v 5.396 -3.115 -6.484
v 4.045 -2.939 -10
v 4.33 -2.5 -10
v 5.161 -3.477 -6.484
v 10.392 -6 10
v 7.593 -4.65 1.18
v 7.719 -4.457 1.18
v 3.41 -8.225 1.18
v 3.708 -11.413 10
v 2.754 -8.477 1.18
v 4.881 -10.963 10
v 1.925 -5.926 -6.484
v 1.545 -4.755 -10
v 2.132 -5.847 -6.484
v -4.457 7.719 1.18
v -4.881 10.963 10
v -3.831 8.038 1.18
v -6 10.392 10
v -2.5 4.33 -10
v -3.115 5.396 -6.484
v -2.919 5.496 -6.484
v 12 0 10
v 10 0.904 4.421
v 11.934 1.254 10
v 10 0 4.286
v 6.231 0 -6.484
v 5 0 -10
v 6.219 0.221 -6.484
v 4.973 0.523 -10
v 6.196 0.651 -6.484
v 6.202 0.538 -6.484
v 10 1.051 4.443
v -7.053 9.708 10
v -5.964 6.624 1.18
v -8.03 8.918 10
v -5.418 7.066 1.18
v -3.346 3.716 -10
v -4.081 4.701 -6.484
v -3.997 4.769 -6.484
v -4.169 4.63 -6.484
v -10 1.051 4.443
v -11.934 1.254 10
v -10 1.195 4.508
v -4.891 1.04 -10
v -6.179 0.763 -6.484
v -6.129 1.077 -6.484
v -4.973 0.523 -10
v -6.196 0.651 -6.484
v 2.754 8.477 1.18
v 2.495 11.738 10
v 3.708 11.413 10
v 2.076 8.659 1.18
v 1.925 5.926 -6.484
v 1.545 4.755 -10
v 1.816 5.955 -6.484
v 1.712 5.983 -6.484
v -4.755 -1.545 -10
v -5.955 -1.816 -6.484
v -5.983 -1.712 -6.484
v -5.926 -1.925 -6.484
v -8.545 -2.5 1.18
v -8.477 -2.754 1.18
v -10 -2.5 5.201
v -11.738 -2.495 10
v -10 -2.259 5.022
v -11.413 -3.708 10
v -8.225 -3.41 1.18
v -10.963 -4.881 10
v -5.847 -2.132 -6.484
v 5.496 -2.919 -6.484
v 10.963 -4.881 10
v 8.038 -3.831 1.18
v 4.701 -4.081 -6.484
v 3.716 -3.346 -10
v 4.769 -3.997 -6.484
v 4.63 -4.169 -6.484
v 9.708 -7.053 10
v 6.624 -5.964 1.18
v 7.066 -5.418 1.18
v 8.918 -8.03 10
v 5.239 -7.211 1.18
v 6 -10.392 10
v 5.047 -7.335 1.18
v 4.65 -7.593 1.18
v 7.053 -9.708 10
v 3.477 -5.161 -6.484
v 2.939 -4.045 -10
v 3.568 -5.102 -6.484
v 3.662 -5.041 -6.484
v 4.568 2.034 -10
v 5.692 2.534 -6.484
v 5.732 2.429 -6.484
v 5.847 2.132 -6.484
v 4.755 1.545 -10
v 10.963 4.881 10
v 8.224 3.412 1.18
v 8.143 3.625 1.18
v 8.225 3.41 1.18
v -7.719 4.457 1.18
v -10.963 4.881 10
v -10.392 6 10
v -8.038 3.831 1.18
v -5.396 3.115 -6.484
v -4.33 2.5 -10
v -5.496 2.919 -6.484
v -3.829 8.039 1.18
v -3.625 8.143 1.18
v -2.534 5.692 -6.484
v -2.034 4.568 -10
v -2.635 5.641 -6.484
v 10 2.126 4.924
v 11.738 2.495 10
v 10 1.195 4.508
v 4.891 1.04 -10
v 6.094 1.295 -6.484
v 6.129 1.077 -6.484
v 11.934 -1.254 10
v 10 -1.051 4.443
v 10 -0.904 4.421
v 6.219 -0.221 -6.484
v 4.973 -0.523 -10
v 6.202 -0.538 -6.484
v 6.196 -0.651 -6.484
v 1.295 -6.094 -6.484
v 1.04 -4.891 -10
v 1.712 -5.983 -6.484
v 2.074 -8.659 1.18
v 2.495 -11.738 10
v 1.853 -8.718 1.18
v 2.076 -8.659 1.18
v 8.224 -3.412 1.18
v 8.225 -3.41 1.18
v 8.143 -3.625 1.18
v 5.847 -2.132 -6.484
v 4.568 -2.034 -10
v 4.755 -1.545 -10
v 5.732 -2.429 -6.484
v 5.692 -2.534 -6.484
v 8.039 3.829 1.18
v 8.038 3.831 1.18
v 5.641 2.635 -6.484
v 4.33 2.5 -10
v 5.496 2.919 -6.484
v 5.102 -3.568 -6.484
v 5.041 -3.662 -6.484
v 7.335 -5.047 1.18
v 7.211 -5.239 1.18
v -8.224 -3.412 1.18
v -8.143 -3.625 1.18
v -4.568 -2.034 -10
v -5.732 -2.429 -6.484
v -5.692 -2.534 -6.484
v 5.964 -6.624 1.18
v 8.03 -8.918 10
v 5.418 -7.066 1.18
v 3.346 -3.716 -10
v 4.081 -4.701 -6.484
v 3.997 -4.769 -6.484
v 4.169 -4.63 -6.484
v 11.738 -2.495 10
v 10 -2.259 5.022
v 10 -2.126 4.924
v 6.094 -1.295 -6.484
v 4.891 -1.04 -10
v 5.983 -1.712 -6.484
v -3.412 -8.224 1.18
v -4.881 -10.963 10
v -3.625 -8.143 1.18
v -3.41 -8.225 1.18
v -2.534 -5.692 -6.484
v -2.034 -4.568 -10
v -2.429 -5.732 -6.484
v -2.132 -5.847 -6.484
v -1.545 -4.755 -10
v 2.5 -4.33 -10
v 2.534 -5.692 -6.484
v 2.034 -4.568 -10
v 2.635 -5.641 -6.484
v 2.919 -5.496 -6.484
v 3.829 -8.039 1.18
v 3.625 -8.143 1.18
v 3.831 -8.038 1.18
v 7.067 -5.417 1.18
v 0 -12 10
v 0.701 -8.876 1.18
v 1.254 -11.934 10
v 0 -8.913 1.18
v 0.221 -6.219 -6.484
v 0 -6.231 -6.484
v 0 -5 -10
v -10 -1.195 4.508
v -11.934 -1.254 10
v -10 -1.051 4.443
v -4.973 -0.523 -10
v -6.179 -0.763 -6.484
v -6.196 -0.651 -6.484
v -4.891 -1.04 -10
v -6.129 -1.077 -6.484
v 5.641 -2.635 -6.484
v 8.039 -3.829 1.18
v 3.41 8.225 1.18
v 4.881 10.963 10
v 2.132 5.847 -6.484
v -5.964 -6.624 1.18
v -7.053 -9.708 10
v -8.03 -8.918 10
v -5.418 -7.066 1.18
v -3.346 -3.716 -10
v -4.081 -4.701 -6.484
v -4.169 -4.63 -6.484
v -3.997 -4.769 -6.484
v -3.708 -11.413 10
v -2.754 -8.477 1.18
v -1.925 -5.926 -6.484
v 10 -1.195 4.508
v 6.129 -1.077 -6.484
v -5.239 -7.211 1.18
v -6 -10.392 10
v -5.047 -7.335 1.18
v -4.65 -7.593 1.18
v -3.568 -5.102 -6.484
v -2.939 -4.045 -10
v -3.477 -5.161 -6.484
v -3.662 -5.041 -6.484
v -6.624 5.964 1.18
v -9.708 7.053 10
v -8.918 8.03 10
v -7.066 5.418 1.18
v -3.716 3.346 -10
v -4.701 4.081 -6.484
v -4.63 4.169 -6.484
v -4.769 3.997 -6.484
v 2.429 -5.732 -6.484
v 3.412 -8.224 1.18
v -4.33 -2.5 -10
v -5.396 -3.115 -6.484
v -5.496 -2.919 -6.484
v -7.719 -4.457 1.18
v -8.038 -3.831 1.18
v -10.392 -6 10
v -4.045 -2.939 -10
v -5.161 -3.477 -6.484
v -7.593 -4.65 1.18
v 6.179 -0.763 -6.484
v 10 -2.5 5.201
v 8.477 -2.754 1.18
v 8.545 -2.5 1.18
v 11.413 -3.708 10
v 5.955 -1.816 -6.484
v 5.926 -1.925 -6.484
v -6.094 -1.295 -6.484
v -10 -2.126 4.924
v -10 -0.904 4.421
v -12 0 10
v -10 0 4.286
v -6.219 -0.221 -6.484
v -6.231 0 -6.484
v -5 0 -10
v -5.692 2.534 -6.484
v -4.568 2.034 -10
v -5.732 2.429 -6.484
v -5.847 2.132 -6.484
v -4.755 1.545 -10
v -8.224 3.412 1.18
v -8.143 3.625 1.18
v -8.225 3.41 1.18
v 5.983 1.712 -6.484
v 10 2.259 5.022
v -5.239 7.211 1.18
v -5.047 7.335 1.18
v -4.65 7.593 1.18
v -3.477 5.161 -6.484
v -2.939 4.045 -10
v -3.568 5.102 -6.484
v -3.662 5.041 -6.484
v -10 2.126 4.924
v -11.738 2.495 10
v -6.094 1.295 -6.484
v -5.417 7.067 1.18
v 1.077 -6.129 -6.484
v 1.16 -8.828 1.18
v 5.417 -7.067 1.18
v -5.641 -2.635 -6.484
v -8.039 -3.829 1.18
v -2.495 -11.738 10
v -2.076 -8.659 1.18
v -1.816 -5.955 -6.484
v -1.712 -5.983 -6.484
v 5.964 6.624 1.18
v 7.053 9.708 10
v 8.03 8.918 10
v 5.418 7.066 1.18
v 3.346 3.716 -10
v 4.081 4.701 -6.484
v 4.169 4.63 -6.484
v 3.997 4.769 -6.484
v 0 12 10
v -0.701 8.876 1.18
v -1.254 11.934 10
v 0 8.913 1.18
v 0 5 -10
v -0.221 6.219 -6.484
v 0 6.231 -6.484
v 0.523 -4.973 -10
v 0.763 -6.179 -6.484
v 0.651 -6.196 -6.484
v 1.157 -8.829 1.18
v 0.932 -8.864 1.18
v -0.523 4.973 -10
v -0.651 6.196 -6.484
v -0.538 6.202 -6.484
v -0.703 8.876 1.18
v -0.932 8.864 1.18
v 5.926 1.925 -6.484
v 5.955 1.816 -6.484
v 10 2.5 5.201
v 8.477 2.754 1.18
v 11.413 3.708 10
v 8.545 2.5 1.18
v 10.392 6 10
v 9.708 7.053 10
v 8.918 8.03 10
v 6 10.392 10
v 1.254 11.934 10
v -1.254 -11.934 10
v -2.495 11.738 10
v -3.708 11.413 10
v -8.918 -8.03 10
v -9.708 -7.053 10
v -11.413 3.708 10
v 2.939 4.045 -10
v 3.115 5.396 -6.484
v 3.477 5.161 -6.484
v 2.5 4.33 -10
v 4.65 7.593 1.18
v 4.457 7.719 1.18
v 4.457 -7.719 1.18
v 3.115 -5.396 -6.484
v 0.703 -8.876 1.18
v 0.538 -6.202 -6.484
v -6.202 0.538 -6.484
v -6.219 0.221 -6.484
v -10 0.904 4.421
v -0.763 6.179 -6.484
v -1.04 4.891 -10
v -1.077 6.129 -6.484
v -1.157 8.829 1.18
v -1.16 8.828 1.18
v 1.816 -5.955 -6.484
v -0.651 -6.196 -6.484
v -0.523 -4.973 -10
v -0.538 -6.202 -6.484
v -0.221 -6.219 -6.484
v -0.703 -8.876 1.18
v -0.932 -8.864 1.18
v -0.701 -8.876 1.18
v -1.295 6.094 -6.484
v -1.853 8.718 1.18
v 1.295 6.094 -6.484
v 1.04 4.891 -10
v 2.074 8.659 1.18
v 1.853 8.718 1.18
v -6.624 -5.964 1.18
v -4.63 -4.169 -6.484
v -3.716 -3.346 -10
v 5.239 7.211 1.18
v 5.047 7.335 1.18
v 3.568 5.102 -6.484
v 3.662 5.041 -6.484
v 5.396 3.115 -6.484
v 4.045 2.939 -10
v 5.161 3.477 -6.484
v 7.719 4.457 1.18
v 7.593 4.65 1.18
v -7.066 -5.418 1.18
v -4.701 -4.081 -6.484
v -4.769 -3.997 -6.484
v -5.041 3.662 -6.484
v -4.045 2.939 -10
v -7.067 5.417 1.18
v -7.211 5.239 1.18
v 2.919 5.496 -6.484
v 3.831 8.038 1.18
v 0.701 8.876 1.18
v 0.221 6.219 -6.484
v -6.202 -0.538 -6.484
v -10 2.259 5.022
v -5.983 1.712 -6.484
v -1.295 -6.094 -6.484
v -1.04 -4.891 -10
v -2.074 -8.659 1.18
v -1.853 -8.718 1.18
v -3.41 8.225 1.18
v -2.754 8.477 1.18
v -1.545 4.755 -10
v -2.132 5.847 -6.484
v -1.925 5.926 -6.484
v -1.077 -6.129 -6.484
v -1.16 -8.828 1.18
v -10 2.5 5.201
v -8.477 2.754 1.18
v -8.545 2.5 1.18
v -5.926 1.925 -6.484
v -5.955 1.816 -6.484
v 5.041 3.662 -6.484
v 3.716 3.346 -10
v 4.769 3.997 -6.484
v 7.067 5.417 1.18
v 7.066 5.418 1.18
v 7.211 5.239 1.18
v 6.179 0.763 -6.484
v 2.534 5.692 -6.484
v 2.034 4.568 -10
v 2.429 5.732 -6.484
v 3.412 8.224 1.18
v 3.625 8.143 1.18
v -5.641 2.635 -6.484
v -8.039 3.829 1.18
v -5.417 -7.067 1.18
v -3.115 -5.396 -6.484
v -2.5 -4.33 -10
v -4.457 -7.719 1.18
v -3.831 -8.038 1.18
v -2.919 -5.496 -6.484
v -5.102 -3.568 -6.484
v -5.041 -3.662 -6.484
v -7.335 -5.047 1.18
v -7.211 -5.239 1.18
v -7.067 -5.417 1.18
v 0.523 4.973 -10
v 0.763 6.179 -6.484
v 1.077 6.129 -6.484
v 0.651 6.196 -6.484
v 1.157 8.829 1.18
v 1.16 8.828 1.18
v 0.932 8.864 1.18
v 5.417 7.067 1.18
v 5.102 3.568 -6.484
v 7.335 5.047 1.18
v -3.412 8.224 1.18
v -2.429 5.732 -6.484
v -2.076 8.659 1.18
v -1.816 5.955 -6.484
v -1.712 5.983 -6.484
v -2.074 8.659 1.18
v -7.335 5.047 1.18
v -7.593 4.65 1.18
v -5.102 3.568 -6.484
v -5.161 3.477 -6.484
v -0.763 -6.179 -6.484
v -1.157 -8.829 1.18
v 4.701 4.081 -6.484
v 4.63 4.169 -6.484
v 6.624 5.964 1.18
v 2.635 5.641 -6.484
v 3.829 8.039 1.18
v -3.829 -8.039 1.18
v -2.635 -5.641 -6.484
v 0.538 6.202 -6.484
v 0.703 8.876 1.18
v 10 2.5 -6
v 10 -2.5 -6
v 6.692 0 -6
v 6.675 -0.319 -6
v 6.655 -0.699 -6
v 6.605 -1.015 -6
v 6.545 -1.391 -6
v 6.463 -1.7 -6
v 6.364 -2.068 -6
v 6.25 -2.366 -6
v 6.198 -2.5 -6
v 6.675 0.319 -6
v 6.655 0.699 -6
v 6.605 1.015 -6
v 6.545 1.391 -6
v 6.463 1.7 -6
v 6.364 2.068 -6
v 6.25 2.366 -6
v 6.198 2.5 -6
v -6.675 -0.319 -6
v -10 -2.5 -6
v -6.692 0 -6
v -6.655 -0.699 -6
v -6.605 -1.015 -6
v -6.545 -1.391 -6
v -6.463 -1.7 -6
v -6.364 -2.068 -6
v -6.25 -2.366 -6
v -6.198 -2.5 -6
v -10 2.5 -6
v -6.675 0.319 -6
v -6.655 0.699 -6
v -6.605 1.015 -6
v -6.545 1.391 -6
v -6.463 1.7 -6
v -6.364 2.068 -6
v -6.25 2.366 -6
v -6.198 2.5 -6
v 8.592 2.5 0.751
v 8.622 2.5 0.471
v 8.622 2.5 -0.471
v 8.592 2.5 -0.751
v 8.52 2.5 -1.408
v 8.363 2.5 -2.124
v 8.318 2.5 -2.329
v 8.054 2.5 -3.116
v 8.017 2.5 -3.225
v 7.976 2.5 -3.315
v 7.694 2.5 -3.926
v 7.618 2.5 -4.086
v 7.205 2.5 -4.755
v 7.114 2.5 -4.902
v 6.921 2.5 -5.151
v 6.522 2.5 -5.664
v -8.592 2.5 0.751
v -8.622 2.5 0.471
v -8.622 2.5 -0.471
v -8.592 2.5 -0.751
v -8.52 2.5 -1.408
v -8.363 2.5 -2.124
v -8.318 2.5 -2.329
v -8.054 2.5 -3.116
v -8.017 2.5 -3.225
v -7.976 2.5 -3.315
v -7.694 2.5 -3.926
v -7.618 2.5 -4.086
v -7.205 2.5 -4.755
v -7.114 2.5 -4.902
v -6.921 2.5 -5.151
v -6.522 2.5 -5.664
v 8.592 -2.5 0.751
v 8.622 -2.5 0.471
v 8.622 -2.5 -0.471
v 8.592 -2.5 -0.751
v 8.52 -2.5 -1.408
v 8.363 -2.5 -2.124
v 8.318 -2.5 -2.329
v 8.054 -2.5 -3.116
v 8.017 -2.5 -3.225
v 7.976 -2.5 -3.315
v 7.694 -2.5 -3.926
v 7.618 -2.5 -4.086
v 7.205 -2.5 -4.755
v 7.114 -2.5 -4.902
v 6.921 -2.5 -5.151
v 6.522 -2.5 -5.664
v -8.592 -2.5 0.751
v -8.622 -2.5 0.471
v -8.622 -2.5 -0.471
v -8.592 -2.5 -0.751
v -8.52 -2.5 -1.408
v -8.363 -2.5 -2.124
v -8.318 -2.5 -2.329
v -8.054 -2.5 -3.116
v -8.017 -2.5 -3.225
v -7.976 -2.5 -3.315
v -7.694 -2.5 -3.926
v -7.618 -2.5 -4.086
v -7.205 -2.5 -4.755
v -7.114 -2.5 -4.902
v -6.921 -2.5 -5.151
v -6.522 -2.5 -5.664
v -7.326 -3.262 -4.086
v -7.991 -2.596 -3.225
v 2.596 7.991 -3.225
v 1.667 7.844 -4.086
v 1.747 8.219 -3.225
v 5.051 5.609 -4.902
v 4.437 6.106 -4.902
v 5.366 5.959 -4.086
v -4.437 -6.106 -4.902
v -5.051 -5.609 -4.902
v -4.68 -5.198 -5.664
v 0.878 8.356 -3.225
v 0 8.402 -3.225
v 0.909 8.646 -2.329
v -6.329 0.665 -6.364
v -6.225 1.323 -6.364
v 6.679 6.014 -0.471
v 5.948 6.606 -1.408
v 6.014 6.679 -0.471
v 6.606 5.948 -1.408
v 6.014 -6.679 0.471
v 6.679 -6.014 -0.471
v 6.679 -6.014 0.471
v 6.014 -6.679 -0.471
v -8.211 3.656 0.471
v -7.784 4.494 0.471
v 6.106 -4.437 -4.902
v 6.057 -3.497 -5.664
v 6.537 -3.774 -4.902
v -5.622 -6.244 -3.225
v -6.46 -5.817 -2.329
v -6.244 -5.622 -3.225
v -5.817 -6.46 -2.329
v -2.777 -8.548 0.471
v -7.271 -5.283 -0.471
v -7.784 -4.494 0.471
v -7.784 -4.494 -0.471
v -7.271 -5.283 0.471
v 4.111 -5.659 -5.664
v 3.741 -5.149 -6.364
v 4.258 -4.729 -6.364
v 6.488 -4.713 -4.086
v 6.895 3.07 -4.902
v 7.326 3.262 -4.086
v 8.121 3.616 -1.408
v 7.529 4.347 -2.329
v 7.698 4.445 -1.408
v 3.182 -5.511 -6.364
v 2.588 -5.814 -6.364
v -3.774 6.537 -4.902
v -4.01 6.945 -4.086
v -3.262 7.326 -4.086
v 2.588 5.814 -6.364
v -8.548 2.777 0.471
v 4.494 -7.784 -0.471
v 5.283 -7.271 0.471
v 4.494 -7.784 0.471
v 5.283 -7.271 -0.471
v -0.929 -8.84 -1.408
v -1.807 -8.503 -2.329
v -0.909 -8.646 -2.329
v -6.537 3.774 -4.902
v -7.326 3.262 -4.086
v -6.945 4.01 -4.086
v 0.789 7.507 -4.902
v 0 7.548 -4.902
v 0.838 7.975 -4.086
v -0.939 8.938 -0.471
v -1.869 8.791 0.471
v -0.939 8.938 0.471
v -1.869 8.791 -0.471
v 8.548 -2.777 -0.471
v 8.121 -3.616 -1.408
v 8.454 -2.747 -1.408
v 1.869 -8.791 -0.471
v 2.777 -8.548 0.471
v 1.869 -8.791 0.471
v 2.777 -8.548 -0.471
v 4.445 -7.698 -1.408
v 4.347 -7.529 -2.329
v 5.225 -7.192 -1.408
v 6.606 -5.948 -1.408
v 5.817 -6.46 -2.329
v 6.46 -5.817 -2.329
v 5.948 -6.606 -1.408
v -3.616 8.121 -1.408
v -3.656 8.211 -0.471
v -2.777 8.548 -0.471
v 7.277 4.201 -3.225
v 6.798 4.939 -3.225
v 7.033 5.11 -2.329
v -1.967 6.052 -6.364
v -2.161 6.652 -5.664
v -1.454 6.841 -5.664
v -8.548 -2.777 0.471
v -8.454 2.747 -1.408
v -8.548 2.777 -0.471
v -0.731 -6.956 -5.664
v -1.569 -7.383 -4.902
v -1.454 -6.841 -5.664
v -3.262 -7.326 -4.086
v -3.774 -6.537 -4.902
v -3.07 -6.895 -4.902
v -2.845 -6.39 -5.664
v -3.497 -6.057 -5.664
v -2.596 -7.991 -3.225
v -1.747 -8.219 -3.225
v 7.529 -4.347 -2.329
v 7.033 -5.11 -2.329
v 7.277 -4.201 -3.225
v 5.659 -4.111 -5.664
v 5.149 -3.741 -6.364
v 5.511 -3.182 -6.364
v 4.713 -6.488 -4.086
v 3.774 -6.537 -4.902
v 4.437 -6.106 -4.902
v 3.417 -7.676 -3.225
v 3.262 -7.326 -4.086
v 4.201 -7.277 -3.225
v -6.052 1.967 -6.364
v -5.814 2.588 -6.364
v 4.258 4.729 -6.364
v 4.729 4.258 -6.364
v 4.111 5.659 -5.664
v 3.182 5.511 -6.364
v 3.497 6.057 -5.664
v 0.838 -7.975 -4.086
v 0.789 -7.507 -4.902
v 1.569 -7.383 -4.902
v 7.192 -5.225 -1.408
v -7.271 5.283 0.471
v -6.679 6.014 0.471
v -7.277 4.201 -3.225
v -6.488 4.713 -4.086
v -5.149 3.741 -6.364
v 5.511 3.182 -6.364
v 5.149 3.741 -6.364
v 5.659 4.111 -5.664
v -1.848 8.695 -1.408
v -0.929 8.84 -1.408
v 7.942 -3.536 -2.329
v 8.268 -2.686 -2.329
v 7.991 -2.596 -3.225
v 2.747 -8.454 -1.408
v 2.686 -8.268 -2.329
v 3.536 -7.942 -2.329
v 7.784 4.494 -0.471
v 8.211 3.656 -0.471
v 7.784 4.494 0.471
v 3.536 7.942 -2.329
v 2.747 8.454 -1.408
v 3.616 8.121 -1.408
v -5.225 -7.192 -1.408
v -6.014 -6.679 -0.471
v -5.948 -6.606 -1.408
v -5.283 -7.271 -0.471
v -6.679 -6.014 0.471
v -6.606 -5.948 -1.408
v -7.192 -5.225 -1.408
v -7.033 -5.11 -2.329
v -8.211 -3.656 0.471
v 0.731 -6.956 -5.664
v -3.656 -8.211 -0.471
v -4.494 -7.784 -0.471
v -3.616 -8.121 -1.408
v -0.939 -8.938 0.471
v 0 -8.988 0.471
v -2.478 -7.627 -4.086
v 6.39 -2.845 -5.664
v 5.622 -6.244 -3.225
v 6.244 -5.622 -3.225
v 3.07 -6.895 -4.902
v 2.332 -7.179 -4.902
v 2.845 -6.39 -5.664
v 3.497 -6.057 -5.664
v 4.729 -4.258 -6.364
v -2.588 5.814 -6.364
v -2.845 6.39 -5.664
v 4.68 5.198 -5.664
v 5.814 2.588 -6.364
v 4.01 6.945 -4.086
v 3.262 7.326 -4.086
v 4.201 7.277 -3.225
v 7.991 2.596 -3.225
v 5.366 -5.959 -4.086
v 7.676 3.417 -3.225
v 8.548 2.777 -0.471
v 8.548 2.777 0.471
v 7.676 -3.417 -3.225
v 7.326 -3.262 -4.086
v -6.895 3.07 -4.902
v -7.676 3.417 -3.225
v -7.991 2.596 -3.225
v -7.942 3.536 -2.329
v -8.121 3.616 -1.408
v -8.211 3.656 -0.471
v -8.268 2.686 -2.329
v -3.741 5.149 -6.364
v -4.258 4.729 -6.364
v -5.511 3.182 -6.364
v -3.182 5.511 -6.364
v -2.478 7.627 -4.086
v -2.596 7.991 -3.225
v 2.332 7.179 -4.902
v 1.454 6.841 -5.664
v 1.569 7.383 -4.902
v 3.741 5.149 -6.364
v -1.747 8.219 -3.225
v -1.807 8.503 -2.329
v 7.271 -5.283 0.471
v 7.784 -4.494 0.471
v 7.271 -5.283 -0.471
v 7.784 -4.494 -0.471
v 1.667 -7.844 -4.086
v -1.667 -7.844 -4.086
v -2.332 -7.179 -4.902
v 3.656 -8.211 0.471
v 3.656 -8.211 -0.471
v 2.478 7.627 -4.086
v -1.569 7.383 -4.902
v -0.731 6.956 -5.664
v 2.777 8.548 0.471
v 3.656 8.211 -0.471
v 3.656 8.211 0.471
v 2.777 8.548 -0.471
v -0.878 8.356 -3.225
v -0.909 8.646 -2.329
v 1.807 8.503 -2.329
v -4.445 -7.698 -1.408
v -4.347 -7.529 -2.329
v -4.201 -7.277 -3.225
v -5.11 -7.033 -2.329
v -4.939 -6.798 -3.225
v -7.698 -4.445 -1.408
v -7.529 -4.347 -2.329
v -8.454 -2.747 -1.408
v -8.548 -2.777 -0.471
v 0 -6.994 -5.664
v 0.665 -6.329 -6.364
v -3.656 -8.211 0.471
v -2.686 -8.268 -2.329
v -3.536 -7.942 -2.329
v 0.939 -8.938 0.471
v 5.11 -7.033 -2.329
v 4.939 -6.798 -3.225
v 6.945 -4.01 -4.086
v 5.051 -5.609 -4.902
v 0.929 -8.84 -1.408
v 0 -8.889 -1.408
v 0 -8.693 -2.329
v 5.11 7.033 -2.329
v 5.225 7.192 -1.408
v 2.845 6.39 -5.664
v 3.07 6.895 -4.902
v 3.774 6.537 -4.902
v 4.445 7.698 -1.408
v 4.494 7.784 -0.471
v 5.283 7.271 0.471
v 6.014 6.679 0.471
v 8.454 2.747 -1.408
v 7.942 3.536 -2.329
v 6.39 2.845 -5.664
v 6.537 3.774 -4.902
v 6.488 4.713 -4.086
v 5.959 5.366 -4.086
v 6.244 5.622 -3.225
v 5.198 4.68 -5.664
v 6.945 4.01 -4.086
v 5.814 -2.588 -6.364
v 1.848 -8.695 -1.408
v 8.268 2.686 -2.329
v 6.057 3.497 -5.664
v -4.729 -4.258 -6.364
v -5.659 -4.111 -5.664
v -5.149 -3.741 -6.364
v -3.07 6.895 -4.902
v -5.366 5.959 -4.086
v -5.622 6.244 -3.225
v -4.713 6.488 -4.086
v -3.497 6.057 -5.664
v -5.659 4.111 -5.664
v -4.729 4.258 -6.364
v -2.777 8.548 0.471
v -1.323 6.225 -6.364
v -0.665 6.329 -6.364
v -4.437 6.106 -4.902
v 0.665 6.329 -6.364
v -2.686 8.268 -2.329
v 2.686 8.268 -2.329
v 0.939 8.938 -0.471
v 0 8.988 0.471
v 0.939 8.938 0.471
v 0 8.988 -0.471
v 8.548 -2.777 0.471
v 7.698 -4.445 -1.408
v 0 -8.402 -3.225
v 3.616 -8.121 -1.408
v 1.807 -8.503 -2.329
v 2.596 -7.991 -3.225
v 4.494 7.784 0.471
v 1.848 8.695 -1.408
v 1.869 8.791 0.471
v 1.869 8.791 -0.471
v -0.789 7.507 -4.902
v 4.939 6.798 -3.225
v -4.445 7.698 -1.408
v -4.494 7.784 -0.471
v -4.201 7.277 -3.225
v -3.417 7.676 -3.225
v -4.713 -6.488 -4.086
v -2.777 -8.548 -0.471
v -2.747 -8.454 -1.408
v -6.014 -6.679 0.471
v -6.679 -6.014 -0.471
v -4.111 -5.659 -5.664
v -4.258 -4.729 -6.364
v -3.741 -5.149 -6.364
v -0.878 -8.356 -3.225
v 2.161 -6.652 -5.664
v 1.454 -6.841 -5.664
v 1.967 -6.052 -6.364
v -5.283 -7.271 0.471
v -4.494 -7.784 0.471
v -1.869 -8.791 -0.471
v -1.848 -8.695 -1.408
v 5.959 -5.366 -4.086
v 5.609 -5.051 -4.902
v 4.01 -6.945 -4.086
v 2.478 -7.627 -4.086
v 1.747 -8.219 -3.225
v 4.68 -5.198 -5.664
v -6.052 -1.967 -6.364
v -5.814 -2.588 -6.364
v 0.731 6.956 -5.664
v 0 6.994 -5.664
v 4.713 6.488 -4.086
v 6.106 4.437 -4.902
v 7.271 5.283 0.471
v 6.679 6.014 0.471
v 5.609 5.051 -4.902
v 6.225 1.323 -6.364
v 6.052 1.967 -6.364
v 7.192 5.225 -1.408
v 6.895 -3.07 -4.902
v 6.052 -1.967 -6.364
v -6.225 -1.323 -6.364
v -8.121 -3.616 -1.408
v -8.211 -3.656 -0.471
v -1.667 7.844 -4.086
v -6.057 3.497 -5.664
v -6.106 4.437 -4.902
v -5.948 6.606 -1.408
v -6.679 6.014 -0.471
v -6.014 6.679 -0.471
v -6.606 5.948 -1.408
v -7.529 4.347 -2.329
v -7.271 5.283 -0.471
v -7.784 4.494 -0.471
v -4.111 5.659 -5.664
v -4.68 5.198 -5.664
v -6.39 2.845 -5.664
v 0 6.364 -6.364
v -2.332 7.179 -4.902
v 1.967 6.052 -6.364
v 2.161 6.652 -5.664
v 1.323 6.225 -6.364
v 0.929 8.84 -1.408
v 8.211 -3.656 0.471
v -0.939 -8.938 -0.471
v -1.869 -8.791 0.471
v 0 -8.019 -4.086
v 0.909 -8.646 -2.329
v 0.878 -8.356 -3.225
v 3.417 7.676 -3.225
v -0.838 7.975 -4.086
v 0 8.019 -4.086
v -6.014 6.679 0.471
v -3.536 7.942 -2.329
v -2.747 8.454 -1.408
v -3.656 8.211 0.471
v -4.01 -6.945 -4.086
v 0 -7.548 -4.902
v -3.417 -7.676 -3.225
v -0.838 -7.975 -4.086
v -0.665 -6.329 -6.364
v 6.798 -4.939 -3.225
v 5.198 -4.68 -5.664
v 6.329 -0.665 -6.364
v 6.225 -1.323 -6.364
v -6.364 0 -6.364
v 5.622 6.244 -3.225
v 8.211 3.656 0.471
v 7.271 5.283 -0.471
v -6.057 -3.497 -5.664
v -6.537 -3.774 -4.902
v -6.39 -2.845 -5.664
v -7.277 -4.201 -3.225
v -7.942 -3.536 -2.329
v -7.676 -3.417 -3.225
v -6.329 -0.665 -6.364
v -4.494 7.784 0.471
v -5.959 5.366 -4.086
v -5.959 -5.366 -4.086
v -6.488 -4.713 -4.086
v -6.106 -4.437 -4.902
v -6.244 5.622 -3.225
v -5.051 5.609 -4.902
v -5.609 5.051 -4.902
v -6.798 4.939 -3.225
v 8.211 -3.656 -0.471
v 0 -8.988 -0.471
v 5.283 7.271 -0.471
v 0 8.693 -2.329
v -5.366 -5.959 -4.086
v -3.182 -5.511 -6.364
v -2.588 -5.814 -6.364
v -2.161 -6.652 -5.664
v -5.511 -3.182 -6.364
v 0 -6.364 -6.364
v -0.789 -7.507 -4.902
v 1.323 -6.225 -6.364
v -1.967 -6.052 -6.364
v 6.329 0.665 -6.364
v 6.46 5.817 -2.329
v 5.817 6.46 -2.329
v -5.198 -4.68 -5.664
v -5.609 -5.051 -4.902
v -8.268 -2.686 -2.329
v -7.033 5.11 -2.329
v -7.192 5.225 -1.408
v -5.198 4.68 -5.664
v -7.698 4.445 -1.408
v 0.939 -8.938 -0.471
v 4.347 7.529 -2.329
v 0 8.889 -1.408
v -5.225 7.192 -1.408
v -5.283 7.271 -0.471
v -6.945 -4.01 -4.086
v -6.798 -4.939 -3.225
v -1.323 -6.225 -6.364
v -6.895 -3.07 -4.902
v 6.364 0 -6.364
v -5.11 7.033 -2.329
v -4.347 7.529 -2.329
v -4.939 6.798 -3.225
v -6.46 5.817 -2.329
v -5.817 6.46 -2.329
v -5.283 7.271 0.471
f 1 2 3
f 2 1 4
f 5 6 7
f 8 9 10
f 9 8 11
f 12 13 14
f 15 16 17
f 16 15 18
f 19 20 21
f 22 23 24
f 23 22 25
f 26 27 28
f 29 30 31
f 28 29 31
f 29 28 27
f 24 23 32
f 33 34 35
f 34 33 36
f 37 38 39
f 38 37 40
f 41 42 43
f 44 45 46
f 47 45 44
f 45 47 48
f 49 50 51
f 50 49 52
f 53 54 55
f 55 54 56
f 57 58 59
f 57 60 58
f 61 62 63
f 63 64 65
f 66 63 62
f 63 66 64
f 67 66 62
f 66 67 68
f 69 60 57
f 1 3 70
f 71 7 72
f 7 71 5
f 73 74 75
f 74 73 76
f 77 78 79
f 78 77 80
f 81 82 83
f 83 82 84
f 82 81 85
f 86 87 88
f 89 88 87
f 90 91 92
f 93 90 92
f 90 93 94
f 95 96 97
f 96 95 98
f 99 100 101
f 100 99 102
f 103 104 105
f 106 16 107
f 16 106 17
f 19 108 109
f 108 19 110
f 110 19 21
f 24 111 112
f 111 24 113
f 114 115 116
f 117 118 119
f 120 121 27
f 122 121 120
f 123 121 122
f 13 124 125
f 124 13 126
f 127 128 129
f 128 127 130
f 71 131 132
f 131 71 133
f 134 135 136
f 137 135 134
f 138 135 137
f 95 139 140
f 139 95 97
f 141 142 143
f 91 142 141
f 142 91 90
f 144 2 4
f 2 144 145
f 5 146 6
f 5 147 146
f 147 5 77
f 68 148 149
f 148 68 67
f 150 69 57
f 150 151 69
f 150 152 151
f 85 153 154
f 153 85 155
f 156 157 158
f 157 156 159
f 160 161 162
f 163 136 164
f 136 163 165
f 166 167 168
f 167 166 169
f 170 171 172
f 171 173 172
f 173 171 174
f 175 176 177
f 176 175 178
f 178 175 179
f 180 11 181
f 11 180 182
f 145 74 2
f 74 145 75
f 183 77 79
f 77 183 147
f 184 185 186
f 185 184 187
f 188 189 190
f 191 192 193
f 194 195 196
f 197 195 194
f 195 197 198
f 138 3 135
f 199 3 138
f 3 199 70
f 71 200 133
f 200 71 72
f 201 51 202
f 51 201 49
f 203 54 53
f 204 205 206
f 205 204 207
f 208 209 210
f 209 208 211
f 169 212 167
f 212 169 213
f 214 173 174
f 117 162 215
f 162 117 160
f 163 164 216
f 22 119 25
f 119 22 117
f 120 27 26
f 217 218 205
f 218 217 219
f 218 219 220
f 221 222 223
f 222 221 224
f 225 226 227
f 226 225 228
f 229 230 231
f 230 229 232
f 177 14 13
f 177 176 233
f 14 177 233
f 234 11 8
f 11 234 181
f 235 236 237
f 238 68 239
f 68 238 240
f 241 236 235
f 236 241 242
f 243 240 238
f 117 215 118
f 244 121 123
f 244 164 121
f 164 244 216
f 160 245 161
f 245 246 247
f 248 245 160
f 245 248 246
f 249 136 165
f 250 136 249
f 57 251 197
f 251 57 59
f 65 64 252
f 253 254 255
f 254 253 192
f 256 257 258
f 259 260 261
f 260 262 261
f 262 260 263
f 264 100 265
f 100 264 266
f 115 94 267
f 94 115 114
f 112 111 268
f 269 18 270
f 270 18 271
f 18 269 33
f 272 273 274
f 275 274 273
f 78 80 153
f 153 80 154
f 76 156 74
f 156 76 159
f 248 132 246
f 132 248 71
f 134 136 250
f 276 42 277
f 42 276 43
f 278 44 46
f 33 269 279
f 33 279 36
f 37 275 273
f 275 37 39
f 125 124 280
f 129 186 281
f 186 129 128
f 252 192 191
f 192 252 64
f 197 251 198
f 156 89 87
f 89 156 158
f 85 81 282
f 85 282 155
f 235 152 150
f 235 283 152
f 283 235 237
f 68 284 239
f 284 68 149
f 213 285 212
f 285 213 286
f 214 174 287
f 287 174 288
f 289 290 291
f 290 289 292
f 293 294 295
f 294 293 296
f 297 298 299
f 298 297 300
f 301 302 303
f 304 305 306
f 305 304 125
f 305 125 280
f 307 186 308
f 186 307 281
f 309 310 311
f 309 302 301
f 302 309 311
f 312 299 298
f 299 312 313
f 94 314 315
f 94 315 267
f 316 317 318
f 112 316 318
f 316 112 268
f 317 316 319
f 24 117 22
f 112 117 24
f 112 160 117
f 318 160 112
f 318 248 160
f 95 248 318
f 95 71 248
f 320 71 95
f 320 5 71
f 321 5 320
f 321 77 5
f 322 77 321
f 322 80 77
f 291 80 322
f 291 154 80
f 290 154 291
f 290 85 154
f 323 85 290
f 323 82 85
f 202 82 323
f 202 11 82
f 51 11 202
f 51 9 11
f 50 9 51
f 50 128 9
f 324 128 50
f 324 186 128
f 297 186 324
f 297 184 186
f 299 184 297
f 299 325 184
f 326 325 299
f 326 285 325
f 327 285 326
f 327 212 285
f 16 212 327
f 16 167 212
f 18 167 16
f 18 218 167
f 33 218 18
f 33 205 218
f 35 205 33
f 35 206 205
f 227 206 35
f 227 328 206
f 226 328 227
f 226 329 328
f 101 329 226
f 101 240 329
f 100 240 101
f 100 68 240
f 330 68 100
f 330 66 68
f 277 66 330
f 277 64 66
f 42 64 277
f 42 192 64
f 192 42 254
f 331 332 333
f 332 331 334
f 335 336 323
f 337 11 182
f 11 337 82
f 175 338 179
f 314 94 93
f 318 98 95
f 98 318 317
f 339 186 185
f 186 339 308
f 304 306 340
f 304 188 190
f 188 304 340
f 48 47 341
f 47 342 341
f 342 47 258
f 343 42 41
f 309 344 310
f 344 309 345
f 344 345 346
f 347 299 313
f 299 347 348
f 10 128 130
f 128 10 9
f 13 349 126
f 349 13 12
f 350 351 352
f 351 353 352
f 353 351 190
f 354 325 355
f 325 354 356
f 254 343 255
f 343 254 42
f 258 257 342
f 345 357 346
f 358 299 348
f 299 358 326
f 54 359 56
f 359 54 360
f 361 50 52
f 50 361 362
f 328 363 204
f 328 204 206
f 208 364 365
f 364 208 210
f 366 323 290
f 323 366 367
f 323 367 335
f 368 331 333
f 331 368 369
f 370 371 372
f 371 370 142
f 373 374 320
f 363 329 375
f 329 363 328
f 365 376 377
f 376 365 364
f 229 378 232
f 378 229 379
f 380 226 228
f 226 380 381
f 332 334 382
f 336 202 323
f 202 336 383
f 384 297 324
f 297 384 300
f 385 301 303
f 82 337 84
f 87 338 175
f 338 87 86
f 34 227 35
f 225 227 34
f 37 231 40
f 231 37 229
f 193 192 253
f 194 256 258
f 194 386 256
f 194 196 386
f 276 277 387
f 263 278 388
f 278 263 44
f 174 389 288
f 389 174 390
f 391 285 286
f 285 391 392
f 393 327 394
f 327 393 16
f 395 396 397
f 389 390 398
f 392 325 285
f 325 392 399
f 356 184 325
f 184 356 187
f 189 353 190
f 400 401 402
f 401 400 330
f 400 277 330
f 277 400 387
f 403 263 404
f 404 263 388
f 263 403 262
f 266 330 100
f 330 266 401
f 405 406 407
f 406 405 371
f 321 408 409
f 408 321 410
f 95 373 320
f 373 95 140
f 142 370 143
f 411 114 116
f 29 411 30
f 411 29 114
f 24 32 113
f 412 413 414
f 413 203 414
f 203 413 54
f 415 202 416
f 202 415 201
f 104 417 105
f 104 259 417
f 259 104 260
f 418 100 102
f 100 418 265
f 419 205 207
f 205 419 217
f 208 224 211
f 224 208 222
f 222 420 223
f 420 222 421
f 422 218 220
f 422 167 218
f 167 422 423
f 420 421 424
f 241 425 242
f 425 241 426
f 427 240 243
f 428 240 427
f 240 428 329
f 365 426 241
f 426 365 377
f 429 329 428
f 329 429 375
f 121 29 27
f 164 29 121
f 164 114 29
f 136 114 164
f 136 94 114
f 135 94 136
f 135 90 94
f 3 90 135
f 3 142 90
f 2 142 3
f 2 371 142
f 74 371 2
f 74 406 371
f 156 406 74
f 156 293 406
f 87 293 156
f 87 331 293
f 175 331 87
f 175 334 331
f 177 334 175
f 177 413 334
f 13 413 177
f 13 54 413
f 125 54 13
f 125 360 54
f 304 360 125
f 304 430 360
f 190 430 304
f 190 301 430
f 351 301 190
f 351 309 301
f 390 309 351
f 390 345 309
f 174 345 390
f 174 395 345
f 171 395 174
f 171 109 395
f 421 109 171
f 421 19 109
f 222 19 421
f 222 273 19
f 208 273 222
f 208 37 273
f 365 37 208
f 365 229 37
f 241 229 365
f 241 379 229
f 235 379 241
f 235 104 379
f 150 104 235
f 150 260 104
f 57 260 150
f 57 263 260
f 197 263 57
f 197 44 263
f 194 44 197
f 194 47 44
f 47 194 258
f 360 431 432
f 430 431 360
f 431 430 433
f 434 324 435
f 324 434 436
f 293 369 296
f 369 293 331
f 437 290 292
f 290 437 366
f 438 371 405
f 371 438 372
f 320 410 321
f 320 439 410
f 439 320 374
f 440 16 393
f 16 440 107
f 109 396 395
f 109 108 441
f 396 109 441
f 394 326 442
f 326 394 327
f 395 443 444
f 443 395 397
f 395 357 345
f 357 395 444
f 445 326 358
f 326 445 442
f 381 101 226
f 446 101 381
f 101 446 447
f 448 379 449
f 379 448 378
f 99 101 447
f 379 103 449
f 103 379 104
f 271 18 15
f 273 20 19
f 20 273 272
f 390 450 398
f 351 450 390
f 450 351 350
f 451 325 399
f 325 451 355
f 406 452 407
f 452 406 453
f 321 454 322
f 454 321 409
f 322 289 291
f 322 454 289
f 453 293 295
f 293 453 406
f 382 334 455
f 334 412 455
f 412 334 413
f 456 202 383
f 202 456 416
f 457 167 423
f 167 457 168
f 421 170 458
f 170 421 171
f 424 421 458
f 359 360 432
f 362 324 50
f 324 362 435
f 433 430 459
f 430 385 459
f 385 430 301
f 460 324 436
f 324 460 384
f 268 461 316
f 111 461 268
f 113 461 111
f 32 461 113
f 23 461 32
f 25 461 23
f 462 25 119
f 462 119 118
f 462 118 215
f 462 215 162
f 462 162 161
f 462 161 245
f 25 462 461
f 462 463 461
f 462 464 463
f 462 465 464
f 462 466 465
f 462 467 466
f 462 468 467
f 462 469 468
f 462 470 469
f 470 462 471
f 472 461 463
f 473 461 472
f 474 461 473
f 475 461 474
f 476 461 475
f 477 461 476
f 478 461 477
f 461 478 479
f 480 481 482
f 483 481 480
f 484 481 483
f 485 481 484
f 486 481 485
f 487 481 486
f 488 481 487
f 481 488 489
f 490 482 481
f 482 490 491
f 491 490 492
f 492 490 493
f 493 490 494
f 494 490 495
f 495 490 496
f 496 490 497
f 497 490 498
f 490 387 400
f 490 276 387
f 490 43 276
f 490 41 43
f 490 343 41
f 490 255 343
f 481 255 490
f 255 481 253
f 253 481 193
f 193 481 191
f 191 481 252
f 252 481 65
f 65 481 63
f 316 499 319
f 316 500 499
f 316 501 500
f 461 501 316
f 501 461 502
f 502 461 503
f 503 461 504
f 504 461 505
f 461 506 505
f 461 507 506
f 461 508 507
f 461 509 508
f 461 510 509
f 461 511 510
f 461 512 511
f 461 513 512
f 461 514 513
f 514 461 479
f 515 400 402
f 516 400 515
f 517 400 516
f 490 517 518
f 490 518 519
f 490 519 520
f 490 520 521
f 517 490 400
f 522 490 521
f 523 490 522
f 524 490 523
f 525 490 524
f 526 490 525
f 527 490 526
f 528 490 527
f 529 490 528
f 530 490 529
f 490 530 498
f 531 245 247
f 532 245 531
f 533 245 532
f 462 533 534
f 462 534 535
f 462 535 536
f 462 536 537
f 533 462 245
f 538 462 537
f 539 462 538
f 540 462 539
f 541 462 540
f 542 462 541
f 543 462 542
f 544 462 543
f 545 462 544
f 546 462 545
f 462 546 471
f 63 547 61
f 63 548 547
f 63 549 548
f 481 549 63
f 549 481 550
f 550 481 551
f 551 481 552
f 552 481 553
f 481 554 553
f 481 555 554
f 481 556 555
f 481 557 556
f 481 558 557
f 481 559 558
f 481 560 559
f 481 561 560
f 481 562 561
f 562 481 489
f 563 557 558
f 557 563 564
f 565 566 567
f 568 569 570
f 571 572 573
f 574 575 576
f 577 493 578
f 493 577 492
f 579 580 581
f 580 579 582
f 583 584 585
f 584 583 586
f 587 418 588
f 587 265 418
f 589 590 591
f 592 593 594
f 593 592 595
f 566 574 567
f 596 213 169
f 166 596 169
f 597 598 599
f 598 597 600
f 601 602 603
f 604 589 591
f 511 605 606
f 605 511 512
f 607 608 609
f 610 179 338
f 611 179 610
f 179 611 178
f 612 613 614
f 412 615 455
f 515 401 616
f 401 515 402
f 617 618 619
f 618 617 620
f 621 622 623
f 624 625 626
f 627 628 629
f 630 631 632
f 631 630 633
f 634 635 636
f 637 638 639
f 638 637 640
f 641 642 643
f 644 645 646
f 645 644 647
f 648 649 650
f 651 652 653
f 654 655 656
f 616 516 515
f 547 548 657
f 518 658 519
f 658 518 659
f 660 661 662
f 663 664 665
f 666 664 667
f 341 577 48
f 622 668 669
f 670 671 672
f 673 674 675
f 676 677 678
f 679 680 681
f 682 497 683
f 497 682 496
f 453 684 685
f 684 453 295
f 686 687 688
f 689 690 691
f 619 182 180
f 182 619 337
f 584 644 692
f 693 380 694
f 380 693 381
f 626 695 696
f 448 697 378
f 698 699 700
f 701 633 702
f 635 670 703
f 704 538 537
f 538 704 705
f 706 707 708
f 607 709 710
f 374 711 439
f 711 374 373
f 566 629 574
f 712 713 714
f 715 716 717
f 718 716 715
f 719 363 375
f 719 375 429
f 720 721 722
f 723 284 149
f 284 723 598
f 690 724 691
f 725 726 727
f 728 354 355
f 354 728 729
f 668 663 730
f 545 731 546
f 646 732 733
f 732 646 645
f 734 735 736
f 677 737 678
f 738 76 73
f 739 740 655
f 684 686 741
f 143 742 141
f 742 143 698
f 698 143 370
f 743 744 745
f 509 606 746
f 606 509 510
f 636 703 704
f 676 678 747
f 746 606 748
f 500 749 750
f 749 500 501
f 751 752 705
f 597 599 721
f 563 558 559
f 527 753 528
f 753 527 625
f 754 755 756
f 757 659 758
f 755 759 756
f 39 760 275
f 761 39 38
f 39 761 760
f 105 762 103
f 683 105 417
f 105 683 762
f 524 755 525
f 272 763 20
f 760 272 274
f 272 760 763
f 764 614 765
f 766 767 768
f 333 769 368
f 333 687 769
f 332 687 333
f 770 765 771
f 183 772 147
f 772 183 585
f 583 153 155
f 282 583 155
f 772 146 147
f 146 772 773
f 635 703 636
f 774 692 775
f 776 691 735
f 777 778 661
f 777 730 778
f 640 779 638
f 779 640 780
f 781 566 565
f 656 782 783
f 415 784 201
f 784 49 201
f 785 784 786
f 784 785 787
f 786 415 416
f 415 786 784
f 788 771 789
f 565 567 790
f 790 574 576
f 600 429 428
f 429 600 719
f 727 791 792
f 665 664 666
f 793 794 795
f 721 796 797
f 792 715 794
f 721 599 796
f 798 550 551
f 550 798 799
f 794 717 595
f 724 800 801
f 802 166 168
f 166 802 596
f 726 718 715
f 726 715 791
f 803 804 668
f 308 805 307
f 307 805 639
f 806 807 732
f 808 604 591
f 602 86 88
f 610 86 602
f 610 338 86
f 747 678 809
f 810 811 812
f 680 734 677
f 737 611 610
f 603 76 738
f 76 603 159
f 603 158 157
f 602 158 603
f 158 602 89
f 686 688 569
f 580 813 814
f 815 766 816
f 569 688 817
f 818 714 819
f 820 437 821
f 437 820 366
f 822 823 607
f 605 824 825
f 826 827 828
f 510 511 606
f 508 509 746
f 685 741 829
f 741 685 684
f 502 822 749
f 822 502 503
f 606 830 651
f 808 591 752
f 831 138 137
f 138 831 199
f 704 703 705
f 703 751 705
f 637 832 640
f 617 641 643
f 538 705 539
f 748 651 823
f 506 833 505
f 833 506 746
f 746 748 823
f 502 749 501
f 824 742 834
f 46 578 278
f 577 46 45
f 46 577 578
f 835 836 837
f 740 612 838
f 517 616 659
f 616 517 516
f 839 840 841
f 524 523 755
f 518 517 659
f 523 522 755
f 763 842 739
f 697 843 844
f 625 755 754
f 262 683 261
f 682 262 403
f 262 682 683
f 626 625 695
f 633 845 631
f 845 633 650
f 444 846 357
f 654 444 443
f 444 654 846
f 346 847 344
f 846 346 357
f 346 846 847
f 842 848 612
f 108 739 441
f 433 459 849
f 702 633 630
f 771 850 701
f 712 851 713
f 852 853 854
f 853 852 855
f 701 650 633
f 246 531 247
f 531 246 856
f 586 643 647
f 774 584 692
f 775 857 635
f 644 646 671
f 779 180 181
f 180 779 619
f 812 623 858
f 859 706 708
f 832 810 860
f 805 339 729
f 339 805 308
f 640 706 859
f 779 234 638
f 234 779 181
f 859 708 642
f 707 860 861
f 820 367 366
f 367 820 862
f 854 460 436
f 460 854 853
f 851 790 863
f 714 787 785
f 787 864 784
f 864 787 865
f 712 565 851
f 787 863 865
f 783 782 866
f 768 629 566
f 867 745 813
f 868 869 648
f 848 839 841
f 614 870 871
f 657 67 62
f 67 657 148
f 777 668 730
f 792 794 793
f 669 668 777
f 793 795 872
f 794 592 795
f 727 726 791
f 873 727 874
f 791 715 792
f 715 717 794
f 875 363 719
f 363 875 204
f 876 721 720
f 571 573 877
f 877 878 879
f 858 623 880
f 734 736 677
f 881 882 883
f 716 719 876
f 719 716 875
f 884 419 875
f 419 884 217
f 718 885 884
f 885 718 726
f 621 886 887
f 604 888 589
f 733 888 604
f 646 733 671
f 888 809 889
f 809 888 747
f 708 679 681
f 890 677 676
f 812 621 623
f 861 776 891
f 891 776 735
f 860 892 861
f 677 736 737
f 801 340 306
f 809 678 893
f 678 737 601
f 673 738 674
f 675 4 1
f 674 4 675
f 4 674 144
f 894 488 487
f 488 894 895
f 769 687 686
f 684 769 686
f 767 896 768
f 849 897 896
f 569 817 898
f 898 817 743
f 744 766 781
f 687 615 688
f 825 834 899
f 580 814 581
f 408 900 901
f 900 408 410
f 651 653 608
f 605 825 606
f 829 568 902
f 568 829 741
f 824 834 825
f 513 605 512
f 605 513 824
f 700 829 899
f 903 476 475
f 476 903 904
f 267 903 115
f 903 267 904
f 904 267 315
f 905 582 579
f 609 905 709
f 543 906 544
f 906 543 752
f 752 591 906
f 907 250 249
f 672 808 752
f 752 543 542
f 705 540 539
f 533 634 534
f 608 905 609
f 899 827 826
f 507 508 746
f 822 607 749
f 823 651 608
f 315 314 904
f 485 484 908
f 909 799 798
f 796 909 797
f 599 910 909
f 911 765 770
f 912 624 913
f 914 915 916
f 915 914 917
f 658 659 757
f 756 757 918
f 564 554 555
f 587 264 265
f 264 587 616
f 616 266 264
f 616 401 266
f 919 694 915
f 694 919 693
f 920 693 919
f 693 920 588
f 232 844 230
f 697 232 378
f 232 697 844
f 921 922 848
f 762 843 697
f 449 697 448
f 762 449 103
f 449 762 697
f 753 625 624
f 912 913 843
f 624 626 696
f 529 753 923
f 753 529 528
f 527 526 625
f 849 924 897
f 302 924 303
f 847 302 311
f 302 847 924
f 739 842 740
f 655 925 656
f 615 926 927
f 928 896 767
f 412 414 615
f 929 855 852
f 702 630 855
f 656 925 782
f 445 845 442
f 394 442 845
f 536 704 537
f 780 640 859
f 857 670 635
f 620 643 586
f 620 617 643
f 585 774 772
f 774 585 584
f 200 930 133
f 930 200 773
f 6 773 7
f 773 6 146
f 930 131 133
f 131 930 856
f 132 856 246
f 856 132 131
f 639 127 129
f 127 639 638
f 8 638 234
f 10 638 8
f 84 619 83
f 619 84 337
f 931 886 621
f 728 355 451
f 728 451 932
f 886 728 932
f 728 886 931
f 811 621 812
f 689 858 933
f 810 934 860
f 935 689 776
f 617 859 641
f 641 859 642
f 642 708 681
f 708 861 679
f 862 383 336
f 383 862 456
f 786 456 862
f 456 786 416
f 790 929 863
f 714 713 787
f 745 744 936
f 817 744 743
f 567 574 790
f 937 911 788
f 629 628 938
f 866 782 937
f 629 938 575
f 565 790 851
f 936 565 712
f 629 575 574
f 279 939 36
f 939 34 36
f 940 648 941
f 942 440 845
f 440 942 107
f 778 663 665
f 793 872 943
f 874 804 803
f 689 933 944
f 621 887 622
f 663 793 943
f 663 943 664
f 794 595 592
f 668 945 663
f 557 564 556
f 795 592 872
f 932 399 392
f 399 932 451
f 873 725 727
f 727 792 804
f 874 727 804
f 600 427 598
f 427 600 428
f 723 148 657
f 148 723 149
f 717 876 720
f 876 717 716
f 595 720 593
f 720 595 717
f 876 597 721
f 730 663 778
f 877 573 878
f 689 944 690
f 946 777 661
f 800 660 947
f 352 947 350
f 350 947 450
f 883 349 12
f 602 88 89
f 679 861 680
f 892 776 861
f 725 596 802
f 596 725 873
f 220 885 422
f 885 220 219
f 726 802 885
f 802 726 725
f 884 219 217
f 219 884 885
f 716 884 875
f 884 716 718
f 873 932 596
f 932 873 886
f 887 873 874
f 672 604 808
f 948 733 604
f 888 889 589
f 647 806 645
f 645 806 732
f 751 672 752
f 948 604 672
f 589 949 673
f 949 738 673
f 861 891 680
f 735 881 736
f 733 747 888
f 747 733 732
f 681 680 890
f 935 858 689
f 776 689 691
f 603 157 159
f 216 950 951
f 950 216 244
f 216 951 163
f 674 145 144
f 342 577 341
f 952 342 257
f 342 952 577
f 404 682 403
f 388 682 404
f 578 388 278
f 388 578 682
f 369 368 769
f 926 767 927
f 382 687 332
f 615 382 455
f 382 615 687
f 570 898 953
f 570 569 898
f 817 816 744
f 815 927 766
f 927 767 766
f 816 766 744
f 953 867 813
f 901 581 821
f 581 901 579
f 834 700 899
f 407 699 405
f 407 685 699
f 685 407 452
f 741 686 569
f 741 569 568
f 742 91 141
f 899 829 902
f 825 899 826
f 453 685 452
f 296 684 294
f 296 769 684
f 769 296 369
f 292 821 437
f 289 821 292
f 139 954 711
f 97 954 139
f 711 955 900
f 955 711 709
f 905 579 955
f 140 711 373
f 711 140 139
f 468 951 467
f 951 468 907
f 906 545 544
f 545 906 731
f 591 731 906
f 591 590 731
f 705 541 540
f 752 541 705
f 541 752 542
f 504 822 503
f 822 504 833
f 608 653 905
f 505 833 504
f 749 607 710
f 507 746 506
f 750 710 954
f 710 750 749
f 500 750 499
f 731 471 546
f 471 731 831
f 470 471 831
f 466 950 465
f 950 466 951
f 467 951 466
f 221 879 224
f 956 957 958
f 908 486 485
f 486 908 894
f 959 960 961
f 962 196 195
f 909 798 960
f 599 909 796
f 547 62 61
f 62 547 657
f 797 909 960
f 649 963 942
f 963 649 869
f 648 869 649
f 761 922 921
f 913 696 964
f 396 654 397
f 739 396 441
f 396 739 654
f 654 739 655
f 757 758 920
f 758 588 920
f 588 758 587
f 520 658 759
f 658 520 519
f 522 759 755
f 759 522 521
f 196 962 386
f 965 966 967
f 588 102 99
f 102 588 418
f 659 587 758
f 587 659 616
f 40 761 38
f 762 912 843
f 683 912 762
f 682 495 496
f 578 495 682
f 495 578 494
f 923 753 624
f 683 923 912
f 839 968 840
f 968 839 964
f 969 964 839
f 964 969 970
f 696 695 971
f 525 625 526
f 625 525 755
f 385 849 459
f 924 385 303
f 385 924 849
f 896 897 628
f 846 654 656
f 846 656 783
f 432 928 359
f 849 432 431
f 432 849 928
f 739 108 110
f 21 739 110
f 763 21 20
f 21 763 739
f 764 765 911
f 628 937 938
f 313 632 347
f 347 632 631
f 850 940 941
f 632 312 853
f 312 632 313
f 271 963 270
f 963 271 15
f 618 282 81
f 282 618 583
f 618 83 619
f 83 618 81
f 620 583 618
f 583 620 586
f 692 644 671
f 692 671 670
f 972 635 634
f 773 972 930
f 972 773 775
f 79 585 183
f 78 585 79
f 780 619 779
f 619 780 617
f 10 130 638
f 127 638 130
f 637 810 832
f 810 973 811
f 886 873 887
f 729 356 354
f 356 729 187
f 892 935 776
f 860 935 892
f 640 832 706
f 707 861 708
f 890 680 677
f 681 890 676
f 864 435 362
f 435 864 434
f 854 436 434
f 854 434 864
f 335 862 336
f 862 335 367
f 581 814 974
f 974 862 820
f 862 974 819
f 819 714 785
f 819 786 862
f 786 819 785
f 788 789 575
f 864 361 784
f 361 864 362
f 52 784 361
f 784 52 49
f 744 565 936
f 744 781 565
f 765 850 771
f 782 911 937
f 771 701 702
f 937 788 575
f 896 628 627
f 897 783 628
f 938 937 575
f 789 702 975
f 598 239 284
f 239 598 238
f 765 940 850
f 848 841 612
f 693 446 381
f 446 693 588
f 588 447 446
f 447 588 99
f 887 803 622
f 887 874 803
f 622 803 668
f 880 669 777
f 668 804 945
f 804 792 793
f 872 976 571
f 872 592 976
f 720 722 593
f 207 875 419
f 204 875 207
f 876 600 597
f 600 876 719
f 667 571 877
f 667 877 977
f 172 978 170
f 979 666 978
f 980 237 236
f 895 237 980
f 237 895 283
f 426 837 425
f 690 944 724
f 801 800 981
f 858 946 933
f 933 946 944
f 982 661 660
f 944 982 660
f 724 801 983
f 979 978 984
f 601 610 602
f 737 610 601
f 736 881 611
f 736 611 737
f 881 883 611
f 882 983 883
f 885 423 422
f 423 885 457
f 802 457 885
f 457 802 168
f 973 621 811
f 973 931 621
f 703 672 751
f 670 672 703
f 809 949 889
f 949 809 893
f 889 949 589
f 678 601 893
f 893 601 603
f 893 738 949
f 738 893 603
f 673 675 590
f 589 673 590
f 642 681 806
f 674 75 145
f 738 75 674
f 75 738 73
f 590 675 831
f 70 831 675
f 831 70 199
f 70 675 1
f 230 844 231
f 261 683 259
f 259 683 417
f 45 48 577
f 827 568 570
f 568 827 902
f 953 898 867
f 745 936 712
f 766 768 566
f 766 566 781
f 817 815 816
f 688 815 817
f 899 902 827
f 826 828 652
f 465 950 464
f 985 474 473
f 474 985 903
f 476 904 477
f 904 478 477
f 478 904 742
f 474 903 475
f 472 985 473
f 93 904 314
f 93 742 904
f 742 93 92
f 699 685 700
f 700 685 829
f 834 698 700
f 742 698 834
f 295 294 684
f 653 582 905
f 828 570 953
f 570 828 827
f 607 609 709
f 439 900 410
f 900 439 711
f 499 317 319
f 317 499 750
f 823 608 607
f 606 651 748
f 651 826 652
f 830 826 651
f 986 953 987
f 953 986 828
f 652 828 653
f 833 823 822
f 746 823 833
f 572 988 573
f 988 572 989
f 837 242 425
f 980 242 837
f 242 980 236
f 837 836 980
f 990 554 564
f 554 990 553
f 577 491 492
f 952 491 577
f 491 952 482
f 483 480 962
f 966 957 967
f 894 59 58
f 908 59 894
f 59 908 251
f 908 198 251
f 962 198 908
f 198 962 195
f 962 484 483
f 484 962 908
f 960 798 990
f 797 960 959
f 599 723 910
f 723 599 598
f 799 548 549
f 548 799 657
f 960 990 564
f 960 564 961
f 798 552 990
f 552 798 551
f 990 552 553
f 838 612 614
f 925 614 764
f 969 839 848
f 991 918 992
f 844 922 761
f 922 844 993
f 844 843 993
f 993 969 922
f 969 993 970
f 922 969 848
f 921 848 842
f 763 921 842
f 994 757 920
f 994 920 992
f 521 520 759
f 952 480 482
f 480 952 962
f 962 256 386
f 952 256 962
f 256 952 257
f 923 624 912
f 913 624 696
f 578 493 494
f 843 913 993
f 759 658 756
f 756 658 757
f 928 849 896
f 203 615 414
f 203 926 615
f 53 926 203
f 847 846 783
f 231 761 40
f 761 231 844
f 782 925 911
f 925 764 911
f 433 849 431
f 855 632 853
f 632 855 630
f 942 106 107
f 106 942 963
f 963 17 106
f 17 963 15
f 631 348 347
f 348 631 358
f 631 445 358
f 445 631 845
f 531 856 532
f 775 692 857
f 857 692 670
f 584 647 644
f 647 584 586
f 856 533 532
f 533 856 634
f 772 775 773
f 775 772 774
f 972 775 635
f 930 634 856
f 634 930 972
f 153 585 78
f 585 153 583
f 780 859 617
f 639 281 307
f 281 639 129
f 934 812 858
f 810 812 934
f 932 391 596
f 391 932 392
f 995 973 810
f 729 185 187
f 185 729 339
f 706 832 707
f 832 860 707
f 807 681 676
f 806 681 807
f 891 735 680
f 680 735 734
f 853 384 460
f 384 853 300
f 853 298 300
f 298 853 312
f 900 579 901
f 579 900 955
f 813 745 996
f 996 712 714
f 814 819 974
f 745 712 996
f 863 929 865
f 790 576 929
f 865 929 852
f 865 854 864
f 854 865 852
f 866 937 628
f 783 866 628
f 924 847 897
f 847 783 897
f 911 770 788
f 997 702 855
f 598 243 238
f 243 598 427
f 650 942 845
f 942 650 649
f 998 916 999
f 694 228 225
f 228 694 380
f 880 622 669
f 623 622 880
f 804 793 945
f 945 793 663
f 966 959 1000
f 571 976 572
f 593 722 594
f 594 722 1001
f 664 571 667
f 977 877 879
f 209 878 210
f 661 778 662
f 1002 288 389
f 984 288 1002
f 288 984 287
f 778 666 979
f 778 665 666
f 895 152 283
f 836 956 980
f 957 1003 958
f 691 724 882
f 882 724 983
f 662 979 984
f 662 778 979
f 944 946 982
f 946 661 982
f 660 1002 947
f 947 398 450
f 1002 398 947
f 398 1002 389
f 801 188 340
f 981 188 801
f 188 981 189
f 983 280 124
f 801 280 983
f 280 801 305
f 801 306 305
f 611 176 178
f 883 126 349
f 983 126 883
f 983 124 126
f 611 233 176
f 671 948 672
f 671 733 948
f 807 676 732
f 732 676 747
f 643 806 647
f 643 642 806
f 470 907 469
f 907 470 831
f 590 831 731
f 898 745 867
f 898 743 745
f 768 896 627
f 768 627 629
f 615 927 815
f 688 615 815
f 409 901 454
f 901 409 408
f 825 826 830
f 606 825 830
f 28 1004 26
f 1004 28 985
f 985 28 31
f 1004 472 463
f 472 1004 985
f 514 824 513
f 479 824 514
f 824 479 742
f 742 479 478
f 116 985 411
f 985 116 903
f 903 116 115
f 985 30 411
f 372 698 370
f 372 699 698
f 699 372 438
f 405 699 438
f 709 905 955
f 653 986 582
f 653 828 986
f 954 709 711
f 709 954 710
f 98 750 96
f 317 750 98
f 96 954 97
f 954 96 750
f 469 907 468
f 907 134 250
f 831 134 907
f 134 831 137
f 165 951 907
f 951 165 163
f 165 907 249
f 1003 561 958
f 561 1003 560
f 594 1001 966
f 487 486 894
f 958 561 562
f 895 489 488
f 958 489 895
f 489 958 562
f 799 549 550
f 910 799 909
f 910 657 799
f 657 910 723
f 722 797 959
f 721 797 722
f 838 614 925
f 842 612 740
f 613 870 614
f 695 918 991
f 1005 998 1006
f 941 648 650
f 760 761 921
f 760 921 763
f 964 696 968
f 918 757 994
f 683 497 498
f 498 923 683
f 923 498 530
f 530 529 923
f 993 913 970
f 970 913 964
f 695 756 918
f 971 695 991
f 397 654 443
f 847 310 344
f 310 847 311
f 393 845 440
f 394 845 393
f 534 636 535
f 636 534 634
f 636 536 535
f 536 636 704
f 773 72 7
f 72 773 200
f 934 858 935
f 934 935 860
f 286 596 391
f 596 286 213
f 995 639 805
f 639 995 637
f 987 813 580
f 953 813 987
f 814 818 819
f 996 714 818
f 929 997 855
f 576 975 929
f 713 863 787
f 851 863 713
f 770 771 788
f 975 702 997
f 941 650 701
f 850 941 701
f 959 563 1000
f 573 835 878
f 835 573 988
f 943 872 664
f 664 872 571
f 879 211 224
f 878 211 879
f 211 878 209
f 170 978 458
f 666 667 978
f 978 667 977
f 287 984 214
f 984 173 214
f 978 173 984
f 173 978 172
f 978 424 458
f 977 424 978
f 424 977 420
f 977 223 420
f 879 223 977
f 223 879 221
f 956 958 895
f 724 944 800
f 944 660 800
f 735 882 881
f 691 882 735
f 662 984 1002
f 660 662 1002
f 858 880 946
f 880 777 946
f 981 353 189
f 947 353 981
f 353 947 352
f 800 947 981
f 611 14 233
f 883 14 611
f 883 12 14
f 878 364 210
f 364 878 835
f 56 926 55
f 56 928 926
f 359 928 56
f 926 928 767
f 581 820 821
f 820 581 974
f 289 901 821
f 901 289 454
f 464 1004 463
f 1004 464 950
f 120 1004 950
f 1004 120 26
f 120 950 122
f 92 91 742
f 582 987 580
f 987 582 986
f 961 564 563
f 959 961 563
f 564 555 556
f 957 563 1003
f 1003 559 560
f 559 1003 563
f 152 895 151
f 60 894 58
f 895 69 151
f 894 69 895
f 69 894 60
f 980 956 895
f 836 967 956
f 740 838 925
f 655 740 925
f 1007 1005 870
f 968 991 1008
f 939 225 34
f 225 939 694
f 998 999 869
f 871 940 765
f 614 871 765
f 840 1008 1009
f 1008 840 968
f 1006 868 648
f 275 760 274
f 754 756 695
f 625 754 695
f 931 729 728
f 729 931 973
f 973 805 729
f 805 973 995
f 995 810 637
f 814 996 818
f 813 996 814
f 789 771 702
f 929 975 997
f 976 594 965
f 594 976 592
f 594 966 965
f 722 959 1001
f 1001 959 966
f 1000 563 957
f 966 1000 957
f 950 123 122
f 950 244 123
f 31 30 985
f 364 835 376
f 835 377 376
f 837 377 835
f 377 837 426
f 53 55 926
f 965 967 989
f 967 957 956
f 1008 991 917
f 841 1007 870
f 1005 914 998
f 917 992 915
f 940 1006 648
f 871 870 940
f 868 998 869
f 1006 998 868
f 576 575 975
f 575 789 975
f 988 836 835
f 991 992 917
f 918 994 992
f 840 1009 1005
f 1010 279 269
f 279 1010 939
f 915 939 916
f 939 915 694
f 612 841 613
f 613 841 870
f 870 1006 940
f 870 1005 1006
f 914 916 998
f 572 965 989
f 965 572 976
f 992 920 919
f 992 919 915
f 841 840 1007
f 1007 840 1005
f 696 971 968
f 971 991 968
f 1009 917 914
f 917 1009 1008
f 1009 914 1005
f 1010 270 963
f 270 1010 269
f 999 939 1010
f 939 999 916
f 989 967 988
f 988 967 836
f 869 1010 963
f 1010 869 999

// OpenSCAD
/*
*******************************************
Objekt Info: Beispiel Modul-Parameter

*******************************************
Version: 30.04.2022 khf
*******************************************
*/

//***************   Auswahl   *************

//keine

//***************   Libraries  ************

//keine

//*****************************************

//***************  Parameter   *************
$fn=60; //Aufloesung

a= 20;
b= 5;
z= 12;
y= 6;
c = true; // Ausrichtung Mitte true oder false

//*****************************************

//**************   Programm  **************

cylinder(h = a, r1 = b, r2 = z, center = c);

cube(size = [a, b, z], center = c);

sphere(d = z+y);
